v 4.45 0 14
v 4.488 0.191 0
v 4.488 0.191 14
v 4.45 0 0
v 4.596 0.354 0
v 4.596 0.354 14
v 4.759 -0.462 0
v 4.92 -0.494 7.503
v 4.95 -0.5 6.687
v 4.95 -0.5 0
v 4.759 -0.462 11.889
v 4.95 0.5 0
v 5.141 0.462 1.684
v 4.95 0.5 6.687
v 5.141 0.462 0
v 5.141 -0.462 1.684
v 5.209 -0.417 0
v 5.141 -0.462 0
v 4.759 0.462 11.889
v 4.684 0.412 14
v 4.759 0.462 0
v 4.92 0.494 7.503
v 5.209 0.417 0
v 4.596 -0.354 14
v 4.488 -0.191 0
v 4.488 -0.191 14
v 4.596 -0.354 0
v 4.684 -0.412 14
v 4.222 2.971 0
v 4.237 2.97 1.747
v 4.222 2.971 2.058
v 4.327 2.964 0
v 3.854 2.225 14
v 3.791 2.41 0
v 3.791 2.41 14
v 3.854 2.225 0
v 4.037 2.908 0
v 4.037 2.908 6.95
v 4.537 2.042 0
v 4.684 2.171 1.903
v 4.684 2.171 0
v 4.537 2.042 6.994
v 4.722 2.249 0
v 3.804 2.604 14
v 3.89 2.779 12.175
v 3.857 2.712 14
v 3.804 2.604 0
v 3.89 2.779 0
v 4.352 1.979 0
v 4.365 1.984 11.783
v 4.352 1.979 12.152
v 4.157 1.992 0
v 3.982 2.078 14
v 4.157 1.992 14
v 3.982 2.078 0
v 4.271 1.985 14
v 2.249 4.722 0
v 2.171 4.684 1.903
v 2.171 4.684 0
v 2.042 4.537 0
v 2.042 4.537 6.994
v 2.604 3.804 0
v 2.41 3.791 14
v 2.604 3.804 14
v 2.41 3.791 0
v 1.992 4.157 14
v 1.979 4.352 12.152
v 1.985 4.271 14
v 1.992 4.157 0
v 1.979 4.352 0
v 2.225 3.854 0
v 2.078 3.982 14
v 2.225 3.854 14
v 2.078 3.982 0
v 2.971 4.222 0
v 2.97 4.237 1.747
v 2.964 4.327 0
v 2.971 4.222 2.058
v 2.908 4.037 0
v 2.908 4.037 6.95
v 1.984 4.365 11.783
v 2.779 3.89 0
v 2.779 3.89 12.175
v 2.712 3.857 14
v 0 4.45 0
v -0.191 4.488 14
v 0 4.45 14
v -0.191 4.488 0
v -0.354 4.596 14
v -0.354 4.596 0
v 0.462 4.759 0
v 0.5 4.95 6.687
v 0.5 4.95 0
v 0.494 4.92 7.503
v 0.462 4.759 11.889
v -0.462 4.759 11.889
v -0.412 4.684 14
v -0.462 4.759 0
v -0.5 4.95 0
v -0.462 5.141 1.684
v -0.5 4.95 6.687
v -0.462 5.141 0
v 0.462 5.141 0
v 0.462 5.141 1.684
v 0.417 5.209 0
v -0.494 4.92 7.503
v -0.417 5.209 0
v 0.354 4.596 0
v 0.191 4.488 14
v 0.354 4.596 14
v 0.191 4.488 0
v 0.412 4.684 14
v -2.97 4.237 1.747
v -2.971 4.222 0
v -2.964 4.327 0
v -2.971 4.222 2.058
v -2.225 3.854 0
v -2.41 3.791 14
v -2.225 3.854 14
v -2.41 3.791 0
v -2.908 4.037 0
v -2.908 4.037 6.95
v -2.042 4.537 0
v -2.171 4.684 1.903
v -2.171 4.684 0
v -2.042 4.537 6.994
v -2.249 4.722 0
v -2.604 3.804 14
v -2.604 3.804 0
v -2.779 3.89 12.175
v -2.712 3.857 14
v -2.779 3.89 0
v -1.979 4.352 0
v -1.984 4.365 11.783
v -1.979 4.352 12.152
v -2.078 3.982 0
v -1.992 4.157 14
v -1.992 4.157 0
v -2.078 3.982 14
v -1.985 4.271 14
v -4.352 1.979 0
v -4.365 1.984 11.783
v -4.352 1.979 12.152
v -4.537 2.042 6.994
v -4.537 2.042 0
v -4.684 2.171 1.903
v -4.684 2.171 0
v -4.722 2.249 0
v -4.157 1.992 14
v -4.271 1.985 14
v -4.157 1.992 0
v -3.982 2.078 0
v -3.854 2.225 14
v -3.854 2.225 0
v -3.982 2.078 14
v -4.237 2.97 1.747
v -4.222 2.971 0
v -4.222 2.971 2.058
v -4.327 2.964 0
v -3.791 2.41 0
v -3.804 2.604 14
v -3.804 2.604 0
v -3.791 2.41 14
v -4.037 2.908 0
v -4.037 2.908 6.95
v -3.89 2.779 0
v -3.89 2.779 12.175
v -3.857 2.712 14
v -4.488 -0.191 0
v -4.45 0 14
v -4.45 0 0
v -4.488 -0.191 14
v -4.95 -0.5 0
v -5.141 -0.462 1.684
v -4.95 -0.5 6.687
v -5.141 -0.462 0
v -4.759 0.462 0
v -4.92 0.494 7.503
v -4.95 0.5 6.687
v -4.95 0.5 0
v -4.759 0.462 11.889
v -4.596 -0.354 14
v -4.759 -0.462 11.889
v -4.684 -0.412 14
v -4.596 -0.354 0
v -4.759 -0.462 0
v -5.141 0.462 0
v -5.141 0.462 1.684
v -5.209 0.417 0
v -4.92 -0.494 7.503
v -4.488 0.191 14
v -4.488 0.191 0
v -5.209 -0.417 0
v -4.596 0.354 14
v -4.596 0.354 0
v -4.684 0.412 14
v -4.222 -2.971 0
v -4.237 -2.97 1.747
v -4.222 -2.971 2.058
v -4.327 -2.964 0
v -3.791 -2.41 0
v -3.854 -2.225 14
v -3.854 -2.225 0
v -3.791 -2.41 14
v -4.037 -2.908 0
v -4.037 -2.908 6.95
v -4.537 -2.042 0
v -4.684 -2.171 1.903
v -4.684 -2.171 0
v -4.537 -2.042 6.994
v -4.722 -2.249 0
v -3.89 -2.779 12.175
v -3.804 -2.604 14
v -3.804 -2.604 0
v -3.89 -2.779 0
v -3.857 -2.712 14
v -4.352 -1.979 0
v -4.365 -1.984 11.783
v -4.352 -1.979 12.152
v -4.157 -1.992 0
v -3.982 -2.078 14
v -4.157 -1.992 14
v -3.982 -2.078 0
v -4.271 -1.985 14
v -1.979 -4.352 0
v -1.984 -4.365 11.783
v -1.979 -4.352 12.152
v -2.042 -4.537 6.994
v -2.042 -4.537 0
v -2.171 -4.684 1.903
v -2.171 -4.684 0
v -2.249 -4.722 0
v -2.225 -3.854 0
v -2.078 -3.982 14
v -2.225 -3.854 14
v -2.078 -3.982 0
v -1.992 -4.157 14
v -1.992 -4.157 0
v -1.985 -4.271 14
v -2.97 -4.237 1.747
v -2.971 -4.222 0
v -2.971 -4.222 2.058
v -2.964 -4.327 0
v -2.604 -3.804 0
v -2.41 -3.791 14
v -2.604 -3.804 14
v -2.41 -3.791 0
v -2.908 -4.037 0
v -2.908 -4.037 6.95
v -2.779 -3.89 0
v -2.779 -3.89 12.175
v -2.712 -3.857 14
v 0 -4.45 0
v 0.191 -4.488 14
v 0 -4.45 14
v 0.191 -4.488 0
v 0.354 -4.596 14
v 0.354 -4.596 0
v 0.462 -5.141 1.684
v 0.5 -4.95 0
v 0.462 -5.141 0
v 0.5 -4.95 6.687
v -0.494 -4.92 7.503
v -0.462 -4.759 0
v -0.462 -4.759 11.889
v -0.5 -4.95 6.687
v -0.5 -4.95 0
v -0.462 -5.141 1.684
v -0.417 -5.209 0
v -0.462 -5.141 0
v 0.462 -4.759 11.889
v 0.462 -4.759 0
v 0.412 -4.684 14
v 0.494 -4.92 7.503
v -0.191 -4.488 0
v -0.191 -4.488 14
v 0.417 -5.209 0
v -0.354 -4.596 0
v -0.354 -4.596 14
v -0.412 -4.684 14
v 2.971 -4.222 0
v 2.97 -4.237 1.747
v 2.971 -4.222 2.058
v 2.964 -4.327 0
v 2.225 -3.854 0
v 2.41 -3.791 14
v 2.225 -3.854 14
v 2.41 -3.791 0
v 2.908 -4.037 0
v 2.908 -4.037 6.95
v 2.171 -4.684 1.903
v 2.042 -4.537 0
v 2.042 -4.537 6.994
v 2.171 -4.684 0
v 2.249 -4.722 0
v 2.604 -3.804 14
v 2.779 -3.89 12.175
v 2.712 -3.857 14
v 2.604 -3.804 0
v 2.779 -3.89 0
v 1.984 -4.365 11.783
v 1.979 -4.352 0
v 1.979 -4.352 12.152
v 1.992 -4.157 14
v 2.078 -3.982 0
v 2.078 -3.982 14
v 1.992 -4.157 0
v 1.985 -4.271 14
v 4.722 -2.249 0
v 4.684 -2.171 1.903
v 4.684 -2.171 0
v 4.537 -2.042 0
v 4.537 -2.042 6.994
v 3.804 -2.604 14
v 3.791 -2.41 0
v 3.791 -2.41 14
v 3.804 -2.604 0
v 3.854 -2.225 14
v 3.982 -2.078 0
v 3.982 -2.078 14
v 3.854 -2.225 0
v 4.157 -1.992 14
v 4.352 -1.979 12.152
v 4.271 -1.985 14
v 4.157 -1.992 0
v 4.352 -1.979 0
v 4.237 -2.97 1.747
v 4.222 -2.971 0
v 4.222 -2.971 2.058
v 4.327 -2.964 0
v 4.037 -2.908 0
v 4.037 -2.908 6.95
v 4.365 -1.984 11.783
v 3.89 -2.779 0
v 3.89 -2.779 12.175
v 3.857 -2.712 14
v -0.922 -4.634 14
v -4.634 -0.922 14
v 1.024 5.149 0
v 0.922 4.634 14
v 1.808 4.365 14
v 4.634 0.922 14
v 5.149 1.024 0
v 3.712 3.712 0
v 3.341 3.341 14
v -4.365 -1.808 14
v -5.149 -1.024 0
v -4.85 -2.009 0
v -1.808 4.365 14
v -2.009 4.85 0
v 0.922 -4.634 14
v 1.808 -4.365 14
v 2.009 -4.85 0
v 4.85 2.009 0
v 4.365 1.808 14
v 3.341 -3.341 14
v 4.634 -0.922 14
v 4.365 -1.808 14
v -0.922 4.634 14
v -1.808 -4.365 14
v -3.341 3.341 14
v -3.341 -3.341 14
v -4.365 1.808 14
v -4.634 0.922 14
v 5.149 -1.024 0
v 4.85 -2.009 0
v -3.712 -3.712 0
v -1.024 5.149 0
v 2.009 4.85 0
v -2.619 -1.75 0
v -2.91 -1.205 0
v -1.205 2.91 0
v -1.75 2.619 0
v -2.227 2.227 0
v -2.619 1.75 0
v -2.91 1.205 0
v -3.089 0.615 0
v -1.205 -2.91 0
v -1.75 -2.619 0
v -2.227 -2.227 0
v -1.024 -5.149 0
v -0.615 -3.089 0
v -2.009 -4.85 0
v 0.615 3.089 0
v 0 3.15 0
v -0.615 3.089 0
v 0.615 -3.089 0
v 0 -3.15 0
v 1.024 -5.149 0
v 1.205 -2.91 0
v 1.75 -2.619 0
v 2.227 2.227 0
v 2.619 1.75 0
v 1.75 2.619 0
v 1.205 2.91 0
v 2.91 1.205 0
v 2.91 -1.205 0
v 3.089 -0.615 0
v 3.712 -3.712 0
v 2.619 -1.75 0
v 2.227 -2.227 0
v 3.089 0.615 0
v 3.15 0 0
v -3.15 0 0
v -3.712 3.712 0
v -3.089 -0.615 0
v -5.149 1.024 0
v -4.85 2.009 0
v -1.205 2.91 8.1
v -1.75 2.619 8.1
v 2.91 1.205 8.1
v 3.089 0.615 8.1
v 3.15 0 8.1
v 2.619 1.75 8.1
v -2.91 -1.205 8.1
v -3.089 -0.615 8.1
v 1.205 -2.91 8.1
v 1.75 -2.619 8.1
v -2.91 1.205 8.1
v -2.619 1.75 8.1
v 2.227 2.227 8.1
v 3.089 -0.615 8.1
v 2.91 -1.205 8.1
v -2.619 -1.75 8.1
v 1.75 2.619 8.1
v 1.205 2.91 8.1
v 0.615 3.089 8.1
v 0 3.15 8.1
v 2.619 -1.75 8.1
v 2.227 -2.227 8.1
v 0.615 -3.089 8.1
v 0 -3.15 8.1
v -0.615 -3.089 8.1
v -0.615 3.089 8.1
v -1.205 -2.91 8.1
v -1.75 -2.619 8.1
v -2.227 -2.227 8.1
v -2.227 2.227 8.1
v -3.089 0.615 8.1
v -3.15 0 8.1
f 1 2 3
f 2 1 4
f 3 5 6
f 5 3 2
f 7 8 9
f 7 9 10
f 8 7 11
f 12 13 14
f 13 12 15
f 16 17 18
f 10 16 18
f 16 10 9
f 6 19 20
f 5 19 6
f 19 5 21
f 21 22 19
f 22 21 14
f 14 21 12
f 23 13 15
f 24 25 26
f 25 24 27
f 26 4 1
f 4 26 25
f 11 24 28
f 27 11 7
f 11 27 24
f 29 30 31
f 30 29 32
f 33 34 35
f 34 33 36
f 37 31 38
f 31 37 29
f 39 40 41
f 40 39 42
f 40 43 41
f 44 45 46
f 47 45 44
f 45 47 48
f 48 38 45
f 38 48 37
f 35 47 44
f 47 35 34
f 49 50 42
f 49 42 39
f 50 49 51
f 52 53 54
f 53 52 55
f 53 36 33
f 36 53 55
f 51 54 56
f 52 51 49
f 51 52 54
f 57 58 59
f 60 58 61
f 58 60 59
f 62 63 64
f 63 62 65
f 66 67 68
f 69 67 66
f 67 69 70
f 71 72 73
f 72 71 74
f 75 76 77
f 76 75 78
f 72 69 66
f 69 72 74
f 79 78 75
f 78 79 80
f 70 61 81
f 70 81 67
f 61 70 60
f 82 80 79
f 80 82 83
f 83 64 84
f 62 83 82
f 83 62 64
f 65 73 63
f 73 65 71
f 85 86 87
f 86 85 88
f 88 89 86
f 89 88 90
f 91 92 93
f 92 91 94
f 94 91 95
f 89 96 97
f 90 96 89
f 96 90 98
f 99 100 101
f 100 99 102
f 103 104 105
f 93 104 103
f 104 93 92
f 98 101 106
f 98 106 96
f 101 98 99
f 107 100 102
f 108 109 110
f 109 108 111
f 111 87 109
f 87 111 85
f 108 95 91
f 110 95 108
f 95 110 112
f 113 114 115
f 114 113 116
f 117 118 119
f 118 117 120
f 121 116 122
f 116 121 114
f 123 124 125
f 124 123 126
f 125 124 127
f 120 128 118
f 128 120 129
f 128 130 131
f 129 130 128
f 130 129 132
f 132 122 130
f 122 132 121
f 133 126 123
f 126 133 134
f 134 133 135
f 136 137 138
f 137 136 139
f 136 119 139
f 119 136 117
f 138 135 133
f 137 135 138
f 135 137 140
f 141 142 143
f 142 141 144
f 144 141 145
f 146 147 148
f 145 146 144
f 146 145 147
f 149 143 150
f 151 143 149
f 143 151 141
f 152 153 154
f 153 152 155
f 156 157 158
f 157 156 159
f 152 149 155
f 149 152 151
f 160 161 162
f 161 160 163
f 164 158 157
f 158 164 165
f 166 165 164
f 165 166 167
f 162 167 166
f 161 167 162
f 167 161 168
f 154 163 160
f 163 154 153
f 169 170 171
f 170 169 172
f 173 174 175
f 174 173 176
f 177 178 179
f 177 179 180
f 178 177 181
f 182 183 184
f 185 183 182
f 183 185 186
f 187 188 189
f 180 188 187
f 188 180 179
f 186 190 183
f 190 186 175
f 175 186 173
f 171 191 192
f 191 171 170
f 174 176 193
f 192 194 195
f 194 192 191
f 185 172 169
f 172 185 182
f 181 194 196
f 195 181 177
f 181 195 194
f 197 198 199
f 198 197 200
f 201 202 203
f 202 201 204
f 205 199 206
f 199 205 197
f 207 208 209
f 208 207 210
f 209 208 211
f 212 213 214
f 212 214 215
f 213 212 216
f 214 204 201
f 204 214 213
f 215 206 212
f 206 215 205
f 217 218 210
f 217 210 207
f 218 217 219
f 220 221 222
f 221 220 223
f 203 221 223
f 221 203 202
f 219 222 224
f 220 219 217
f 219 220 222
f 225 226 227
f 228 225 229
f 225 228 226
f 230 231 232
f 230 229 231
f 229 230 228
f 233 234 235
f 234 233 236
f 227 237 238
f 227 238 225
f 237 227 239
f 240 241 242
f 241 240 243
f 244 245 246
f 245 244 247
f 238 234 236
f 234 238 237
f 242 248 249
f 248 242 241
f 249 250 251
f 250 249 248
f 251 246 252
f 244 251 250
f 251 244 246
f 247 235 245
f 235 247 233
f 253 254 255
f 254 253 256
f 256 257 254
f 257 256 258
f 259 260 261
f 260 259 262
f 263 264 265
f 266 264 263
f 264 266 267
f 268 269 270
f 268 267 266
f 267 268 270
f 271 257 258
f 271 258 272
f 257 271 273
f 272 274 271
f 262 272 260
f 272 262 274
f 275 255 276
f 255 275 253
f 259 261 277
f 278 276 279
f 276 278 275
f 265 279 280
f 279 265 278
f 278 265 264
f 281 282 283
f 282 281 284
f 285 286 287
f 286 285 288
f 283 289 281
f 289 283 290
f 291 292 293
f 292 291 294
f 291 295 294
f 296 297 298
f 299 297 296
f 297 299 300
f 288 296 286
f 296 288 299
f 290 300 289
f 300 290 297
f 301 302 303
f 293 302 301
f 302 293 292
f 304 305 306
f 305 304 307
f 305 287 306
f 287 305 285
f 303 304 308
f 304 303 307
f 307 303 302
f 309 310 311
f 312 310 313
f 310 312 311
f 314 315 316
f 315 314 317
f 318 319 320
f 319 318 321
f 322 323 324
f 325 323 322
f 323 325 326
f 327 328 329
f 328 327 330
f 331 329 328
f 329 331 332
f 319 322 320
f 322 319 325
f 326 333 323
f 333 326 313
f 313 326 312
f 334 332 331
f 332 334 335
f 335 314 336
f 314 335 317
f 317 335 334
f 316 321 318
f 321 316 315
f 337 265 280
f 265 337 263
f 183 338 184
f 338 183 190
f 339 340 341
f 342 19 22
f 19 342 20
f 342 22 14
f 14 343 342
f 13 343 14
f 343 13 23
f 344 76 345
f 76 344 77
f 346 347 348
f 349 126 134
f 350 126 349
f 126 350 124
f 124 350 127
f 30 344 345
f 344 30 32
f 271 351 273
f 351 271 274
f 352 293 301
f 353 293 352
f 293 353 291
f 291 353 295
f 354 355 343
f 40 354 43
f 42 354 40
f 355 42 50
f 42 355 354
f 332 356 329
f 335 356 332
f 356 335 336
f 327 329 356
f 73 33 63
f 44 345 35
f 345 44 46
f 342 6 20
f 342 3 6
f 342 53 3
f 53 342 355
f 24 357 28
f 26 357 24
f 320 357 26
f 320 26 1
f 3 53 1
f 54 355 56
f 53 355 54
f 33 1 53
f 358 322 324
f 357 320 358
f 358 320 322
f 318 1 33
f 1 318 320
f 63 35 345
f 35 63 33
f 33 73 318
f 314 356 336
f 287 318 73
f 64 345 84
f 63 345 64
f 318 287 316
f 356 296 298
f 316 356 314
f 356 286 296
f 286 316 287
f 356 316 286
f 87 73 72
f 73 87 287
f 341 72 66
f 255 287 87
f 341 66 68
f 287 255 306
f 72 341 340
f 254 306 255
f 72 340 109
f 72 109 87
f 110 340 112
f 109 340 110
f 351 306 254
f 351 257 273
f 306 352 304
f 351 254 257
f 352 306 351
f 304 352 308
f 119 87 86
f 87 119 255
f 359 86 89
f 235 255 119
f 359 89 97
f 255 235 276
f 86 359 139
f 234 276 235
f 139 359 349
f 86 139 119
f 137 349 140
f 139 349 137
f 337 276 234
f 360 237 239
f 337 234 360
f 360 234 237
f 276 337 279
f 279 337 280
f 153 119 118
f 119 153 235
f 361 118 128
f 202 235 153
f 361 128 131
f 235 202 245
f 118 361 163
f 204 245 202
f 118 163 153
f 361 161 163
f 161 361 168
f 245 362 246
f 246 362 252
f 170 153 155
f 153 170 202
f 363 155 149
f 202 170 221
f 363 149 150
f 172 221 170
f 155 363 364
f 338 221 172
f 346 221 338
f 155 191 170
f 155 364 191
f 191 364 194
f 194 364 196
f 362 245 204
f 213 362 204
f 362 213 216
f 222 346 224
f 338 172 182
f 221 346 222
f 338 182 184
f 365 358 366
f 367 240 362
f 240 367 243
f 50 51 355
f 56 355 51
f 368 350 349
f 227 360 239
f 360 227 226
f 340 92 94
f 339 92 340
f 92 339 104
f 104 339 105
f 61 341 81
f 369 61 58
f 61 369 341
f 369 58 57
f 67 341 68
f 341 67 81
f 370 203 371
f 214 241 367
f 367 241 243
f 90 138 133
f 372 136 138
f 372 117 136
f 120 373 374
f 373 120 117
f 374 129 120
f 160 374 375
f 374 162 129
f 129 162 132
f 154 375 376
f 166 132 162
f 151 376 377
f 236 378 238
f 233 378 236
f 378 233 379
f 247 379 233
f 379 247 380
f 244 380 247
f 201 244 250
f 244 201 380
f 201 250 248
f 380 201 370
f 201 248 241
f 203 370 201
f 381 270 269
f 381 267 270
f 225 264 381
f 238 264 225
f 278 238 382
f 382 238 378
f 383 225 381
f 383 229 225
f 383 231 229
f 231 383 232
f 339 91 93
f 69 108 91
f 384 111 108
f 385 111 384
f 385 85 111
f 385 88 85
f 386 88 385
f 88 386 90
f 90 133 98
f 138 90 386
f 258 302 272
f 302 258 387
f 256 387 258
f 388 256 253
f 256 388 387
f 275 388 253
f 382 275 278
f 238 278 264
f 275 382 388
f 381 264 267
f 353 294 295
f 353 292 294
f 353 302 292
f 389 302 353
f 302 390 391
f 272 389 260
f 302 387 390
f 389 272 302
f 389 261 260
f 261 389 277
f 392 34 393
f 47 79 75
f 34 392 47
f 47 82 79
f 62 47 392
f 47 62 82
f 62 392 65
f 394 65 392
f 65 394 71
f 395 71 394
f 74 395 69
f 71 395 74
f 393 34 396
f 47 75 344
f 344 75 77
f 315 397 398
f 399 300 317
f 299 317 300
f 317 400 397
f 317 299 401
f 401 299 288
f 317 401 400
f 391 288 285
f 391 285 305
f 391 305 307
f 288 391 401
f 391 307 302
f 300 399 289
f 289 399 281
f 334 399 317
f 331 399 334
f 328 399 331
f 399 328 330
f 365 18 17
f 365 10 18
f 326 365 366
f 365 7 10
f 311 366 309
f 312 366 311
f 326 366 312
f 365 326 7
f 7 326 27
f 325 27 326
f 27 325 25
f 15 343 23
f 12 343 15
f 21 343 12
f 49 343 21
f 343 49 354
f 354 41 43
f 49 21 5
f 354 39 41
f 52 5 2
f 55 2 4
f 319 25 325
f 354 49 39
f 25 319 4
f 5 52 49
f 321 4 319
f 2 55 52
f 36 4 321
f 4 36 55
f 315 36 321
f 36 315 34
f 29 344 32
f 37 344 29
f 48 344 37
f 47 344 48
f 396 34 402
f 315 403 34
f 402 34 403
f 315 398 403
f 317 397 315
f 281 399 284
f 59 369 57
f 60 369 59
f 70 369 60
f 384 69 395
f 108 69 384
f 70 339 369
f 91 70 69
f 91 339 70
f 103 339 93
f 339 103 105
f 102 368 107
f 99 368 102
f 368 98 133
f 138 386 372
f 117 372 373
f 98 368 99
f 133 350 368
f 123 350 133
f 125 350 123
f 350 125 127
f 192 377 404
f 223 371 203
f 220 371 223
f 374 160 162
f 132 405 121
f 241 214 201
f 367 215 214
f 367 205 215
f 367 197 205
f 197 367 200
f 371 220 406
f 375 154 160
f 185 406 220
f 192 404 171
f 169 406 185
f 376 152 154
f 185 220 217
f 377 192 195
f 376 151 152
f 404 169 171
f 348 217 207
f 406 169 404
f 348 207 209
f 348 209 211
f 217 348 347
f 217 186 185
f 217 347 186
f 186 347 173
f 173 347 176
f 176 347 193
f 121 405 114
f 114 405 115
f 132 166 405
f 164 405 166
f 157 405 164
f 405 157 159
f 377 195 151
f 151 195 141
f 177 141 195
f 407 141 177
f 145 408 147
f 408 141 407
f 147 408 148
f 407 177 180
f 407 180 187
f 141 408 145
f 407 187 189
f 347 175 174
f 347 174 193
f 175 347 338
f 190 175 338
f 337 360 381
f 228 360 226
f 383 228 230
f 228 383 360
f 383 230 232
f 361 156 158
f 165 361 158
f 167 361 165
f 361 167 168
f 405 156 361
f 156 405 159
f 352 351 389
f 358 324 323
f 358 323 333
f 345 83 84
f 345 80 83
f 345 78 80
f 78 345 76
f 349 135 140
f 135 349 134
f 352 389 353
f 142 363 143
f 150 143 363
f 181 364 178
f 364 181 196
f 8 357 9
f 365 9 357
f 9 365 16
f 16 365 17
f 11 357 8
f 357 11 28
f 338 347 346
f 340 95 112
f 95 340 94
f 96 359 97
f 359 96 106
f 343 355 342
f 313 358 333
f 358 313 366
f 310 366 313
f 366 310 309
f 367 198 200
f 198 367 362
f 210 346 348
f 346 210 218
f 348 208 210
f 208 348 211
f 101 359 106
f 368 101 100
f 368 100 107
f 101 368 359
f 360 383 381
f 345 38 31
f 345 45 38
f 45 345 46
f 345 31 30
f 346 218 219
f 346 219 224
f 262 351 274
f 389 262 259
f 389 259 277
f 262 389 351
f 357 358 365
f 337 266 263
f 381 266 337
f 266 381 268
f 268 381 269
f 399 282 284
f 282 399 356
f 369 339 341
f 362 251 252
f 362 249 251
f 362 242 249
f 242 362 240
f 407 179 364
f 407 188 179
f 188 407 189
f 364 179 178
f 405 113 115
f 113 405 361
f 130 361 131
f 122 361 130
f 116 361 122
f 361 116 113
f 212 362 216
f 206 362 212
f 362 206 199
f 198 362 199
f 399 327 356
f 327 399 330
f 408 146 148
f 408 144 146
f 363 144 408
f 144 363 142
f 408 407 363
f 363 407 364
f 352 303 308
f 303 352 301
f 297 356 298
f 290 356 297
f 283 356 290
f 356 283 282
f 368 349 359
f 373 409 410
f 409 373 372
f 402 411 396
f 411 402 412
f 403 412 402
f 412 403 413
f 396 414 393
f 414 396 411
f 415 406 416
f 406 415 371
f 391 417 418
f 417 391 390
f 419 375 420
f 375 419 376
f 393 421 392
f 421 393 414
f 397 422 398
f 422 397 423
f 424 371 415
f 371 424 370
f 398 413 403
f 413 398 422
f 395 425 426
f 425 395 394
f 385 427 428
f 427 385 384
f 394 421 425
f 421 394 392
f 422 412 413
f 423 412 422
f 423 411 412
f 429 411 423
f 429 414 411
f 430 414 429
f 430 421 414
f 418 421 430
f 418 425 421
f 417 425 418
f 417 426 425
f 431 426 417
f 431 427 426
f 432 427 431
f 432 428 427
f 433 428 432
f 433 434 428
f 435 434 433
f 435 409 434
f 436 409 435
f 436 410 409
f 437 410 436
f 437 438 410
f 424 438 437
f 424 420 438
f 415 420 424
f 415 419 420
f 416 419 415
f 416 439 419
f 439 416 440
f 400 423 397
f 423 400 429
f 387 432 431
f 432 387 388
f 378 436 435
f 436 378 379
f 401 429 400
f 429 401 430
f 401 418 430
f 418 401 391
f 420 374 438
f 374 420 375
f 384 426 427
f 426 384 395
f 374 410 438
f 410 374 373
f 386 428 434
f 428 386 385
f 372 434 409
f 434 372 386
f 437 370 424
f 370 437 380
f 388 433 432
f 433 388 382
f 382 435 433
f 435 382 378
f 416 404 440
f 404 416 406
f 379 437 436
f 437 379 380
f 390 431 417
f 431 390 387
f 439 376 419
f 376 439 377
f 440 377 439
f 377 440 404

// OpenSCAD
// ACCESS KNOB — Make Noise Eurorack Module Knob
// Generated via CLI for Studio Knobs
module access_knob_makenoise_euro() {
  outer_d = 10.5;
  height = 14;
  taper = 0.9;
  bore_d = 6;
  slot_h = 8;
  tex_depth = 0.6;
  tex_scale = 1;
  tex_count = 12;

  difference() {
    cylinder(h=height, d1=outer_d, d2=outer_d*taper, $fn=32);
    translate([0,0,-0.1]) cylinder(h=slot_h+0.2, d=bore_d + 0.3, $fn=32);
    for(i=[0:tex_count-1]) {
      rotate([0,0,i*(360/tex_count)])
        translate([outer_d/2-tex_depth/2, 0, height/2])
          cylinder(h=height*1.1, d=tex_scale, center=true, $fn=16);
    }
  }
}
access_knob_makenoise_euro();
